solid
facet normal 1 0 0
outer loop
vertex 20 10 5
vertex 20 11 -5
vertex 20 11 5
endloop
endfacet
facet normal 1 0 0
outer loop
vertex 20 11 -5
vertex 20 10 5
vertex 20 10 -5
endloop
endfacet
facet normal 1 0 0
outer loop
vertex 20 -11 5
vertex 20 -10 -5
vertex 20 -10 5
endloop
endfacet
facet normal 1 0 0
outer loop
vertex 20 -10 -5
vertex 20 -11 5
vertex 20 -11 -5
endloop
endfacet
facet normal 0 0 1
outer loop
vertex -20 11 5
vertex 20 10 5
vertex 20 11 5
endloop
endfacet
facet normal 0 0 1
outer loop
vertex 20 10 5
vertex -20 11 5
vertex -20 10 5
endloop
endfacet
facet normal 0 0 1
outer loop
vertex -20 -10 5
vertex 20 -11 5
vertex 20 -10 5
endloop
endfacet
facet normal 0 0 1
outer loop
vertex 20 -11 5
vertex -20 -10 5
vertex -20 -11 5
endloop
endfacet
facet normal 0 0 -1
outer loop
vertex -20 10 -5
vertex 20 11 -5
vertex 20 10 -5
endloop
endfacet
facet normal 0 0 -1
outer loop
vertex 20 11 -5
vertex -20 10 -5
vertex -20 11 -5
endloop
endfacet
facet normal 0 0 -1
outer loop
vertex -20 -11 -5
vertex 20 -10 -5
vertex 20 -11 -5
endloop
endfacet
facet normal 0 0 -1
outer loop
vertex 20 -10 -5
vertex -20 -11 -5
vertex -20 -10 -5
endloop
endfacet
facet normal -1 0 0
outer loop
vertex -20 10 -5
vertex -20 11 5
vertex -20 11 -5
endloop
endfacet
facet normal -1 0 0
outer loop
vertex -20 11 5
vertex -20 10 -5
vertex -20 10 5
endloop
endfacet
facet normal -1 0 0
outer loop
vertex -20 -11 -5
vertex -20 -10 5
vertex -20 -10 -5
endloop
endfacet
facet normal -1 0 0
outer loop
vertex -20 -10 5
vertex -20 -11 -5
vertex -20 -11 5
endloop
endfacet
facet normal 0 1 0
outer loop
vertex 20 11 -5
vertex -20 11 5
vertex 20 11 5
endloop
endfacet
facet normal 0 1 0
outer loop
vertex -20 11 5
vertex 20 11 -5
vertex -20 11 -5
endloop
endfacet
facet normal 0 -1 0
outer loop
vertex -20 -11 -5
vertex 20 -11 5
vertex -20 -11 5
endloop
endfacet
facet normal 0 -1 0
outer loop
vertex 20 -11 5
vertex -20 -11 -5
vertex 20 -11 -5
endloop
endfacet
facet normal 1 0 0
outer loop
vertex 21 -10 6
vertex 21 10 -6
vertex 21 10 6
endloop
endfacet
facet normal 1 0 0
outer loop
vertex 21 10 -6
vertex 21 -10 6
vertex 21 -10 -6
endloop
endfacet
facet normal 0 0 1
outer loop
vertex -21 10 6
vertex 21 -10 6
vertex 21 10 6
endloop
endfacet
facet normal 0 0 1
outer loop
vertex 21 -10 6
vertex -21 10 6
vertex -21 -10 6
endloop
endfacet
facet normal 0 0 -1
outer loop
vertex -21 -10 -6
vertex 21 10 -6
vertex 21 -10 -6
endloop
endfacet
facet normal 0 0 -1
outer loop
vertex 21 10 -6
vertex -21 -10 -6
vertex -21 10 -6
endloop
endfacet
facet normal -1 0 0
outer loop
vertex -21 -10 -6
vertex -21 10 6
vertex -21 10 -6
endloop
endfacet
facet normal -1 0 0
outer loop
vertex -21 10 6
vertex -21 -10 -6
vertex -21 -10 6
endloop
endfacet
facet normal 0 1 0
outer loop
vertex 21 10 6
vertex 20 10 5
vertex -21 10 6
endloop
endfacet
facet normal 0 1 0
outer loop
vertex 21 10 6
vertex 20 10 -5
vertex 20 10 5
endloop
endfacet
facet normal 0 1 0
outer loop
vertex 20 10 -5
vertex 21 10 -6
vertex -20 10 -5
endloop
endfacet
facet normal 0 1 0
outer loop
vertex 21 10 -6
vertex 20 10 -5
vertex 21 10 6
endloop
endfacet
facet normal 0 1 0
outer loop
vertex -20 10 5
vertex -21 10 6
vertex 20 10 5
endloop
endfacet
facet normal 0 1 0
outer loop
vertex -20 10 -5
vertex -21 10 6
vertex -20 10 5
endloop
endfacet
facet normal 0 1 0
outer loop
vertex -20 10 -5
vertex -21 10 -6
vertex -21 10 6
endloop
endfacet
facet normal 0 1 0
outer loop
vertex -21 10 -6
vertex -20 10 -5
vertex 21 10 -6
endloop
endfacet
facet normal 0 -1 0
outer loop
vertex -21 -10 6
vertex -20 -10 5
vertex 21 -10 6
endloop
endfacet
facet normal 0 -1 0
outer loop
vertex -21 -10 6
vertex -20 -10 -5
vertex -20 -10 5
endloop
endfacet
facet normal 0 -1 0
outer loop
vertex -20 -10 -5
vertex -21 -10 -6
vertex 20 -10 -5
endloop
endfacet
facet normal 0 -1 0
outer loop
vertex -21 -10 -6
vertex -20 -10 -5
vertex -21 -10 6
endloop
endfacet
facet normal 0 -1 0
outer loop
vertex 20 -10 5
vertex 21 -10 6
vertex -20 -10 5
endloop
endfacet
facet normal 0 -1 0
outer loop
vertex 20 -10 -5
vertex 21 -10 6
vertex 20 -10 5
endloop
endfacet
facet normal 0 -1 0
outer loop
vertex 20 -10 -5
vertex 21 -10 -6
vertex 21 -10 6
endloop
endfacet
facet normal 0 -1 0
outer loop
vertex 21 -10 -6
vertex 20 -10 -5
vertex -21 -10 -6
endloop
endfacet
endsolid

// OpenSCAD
// Unit of length: Unit.MM
union()
{
   color(c = [1.0, 0.0, 0.0, 1.0])
   {
      cube(size = [40.0, 22.0, 10.0], center = true);
   }
   cube(size = [42.0, 20.0, 12.0], center = true);
}
